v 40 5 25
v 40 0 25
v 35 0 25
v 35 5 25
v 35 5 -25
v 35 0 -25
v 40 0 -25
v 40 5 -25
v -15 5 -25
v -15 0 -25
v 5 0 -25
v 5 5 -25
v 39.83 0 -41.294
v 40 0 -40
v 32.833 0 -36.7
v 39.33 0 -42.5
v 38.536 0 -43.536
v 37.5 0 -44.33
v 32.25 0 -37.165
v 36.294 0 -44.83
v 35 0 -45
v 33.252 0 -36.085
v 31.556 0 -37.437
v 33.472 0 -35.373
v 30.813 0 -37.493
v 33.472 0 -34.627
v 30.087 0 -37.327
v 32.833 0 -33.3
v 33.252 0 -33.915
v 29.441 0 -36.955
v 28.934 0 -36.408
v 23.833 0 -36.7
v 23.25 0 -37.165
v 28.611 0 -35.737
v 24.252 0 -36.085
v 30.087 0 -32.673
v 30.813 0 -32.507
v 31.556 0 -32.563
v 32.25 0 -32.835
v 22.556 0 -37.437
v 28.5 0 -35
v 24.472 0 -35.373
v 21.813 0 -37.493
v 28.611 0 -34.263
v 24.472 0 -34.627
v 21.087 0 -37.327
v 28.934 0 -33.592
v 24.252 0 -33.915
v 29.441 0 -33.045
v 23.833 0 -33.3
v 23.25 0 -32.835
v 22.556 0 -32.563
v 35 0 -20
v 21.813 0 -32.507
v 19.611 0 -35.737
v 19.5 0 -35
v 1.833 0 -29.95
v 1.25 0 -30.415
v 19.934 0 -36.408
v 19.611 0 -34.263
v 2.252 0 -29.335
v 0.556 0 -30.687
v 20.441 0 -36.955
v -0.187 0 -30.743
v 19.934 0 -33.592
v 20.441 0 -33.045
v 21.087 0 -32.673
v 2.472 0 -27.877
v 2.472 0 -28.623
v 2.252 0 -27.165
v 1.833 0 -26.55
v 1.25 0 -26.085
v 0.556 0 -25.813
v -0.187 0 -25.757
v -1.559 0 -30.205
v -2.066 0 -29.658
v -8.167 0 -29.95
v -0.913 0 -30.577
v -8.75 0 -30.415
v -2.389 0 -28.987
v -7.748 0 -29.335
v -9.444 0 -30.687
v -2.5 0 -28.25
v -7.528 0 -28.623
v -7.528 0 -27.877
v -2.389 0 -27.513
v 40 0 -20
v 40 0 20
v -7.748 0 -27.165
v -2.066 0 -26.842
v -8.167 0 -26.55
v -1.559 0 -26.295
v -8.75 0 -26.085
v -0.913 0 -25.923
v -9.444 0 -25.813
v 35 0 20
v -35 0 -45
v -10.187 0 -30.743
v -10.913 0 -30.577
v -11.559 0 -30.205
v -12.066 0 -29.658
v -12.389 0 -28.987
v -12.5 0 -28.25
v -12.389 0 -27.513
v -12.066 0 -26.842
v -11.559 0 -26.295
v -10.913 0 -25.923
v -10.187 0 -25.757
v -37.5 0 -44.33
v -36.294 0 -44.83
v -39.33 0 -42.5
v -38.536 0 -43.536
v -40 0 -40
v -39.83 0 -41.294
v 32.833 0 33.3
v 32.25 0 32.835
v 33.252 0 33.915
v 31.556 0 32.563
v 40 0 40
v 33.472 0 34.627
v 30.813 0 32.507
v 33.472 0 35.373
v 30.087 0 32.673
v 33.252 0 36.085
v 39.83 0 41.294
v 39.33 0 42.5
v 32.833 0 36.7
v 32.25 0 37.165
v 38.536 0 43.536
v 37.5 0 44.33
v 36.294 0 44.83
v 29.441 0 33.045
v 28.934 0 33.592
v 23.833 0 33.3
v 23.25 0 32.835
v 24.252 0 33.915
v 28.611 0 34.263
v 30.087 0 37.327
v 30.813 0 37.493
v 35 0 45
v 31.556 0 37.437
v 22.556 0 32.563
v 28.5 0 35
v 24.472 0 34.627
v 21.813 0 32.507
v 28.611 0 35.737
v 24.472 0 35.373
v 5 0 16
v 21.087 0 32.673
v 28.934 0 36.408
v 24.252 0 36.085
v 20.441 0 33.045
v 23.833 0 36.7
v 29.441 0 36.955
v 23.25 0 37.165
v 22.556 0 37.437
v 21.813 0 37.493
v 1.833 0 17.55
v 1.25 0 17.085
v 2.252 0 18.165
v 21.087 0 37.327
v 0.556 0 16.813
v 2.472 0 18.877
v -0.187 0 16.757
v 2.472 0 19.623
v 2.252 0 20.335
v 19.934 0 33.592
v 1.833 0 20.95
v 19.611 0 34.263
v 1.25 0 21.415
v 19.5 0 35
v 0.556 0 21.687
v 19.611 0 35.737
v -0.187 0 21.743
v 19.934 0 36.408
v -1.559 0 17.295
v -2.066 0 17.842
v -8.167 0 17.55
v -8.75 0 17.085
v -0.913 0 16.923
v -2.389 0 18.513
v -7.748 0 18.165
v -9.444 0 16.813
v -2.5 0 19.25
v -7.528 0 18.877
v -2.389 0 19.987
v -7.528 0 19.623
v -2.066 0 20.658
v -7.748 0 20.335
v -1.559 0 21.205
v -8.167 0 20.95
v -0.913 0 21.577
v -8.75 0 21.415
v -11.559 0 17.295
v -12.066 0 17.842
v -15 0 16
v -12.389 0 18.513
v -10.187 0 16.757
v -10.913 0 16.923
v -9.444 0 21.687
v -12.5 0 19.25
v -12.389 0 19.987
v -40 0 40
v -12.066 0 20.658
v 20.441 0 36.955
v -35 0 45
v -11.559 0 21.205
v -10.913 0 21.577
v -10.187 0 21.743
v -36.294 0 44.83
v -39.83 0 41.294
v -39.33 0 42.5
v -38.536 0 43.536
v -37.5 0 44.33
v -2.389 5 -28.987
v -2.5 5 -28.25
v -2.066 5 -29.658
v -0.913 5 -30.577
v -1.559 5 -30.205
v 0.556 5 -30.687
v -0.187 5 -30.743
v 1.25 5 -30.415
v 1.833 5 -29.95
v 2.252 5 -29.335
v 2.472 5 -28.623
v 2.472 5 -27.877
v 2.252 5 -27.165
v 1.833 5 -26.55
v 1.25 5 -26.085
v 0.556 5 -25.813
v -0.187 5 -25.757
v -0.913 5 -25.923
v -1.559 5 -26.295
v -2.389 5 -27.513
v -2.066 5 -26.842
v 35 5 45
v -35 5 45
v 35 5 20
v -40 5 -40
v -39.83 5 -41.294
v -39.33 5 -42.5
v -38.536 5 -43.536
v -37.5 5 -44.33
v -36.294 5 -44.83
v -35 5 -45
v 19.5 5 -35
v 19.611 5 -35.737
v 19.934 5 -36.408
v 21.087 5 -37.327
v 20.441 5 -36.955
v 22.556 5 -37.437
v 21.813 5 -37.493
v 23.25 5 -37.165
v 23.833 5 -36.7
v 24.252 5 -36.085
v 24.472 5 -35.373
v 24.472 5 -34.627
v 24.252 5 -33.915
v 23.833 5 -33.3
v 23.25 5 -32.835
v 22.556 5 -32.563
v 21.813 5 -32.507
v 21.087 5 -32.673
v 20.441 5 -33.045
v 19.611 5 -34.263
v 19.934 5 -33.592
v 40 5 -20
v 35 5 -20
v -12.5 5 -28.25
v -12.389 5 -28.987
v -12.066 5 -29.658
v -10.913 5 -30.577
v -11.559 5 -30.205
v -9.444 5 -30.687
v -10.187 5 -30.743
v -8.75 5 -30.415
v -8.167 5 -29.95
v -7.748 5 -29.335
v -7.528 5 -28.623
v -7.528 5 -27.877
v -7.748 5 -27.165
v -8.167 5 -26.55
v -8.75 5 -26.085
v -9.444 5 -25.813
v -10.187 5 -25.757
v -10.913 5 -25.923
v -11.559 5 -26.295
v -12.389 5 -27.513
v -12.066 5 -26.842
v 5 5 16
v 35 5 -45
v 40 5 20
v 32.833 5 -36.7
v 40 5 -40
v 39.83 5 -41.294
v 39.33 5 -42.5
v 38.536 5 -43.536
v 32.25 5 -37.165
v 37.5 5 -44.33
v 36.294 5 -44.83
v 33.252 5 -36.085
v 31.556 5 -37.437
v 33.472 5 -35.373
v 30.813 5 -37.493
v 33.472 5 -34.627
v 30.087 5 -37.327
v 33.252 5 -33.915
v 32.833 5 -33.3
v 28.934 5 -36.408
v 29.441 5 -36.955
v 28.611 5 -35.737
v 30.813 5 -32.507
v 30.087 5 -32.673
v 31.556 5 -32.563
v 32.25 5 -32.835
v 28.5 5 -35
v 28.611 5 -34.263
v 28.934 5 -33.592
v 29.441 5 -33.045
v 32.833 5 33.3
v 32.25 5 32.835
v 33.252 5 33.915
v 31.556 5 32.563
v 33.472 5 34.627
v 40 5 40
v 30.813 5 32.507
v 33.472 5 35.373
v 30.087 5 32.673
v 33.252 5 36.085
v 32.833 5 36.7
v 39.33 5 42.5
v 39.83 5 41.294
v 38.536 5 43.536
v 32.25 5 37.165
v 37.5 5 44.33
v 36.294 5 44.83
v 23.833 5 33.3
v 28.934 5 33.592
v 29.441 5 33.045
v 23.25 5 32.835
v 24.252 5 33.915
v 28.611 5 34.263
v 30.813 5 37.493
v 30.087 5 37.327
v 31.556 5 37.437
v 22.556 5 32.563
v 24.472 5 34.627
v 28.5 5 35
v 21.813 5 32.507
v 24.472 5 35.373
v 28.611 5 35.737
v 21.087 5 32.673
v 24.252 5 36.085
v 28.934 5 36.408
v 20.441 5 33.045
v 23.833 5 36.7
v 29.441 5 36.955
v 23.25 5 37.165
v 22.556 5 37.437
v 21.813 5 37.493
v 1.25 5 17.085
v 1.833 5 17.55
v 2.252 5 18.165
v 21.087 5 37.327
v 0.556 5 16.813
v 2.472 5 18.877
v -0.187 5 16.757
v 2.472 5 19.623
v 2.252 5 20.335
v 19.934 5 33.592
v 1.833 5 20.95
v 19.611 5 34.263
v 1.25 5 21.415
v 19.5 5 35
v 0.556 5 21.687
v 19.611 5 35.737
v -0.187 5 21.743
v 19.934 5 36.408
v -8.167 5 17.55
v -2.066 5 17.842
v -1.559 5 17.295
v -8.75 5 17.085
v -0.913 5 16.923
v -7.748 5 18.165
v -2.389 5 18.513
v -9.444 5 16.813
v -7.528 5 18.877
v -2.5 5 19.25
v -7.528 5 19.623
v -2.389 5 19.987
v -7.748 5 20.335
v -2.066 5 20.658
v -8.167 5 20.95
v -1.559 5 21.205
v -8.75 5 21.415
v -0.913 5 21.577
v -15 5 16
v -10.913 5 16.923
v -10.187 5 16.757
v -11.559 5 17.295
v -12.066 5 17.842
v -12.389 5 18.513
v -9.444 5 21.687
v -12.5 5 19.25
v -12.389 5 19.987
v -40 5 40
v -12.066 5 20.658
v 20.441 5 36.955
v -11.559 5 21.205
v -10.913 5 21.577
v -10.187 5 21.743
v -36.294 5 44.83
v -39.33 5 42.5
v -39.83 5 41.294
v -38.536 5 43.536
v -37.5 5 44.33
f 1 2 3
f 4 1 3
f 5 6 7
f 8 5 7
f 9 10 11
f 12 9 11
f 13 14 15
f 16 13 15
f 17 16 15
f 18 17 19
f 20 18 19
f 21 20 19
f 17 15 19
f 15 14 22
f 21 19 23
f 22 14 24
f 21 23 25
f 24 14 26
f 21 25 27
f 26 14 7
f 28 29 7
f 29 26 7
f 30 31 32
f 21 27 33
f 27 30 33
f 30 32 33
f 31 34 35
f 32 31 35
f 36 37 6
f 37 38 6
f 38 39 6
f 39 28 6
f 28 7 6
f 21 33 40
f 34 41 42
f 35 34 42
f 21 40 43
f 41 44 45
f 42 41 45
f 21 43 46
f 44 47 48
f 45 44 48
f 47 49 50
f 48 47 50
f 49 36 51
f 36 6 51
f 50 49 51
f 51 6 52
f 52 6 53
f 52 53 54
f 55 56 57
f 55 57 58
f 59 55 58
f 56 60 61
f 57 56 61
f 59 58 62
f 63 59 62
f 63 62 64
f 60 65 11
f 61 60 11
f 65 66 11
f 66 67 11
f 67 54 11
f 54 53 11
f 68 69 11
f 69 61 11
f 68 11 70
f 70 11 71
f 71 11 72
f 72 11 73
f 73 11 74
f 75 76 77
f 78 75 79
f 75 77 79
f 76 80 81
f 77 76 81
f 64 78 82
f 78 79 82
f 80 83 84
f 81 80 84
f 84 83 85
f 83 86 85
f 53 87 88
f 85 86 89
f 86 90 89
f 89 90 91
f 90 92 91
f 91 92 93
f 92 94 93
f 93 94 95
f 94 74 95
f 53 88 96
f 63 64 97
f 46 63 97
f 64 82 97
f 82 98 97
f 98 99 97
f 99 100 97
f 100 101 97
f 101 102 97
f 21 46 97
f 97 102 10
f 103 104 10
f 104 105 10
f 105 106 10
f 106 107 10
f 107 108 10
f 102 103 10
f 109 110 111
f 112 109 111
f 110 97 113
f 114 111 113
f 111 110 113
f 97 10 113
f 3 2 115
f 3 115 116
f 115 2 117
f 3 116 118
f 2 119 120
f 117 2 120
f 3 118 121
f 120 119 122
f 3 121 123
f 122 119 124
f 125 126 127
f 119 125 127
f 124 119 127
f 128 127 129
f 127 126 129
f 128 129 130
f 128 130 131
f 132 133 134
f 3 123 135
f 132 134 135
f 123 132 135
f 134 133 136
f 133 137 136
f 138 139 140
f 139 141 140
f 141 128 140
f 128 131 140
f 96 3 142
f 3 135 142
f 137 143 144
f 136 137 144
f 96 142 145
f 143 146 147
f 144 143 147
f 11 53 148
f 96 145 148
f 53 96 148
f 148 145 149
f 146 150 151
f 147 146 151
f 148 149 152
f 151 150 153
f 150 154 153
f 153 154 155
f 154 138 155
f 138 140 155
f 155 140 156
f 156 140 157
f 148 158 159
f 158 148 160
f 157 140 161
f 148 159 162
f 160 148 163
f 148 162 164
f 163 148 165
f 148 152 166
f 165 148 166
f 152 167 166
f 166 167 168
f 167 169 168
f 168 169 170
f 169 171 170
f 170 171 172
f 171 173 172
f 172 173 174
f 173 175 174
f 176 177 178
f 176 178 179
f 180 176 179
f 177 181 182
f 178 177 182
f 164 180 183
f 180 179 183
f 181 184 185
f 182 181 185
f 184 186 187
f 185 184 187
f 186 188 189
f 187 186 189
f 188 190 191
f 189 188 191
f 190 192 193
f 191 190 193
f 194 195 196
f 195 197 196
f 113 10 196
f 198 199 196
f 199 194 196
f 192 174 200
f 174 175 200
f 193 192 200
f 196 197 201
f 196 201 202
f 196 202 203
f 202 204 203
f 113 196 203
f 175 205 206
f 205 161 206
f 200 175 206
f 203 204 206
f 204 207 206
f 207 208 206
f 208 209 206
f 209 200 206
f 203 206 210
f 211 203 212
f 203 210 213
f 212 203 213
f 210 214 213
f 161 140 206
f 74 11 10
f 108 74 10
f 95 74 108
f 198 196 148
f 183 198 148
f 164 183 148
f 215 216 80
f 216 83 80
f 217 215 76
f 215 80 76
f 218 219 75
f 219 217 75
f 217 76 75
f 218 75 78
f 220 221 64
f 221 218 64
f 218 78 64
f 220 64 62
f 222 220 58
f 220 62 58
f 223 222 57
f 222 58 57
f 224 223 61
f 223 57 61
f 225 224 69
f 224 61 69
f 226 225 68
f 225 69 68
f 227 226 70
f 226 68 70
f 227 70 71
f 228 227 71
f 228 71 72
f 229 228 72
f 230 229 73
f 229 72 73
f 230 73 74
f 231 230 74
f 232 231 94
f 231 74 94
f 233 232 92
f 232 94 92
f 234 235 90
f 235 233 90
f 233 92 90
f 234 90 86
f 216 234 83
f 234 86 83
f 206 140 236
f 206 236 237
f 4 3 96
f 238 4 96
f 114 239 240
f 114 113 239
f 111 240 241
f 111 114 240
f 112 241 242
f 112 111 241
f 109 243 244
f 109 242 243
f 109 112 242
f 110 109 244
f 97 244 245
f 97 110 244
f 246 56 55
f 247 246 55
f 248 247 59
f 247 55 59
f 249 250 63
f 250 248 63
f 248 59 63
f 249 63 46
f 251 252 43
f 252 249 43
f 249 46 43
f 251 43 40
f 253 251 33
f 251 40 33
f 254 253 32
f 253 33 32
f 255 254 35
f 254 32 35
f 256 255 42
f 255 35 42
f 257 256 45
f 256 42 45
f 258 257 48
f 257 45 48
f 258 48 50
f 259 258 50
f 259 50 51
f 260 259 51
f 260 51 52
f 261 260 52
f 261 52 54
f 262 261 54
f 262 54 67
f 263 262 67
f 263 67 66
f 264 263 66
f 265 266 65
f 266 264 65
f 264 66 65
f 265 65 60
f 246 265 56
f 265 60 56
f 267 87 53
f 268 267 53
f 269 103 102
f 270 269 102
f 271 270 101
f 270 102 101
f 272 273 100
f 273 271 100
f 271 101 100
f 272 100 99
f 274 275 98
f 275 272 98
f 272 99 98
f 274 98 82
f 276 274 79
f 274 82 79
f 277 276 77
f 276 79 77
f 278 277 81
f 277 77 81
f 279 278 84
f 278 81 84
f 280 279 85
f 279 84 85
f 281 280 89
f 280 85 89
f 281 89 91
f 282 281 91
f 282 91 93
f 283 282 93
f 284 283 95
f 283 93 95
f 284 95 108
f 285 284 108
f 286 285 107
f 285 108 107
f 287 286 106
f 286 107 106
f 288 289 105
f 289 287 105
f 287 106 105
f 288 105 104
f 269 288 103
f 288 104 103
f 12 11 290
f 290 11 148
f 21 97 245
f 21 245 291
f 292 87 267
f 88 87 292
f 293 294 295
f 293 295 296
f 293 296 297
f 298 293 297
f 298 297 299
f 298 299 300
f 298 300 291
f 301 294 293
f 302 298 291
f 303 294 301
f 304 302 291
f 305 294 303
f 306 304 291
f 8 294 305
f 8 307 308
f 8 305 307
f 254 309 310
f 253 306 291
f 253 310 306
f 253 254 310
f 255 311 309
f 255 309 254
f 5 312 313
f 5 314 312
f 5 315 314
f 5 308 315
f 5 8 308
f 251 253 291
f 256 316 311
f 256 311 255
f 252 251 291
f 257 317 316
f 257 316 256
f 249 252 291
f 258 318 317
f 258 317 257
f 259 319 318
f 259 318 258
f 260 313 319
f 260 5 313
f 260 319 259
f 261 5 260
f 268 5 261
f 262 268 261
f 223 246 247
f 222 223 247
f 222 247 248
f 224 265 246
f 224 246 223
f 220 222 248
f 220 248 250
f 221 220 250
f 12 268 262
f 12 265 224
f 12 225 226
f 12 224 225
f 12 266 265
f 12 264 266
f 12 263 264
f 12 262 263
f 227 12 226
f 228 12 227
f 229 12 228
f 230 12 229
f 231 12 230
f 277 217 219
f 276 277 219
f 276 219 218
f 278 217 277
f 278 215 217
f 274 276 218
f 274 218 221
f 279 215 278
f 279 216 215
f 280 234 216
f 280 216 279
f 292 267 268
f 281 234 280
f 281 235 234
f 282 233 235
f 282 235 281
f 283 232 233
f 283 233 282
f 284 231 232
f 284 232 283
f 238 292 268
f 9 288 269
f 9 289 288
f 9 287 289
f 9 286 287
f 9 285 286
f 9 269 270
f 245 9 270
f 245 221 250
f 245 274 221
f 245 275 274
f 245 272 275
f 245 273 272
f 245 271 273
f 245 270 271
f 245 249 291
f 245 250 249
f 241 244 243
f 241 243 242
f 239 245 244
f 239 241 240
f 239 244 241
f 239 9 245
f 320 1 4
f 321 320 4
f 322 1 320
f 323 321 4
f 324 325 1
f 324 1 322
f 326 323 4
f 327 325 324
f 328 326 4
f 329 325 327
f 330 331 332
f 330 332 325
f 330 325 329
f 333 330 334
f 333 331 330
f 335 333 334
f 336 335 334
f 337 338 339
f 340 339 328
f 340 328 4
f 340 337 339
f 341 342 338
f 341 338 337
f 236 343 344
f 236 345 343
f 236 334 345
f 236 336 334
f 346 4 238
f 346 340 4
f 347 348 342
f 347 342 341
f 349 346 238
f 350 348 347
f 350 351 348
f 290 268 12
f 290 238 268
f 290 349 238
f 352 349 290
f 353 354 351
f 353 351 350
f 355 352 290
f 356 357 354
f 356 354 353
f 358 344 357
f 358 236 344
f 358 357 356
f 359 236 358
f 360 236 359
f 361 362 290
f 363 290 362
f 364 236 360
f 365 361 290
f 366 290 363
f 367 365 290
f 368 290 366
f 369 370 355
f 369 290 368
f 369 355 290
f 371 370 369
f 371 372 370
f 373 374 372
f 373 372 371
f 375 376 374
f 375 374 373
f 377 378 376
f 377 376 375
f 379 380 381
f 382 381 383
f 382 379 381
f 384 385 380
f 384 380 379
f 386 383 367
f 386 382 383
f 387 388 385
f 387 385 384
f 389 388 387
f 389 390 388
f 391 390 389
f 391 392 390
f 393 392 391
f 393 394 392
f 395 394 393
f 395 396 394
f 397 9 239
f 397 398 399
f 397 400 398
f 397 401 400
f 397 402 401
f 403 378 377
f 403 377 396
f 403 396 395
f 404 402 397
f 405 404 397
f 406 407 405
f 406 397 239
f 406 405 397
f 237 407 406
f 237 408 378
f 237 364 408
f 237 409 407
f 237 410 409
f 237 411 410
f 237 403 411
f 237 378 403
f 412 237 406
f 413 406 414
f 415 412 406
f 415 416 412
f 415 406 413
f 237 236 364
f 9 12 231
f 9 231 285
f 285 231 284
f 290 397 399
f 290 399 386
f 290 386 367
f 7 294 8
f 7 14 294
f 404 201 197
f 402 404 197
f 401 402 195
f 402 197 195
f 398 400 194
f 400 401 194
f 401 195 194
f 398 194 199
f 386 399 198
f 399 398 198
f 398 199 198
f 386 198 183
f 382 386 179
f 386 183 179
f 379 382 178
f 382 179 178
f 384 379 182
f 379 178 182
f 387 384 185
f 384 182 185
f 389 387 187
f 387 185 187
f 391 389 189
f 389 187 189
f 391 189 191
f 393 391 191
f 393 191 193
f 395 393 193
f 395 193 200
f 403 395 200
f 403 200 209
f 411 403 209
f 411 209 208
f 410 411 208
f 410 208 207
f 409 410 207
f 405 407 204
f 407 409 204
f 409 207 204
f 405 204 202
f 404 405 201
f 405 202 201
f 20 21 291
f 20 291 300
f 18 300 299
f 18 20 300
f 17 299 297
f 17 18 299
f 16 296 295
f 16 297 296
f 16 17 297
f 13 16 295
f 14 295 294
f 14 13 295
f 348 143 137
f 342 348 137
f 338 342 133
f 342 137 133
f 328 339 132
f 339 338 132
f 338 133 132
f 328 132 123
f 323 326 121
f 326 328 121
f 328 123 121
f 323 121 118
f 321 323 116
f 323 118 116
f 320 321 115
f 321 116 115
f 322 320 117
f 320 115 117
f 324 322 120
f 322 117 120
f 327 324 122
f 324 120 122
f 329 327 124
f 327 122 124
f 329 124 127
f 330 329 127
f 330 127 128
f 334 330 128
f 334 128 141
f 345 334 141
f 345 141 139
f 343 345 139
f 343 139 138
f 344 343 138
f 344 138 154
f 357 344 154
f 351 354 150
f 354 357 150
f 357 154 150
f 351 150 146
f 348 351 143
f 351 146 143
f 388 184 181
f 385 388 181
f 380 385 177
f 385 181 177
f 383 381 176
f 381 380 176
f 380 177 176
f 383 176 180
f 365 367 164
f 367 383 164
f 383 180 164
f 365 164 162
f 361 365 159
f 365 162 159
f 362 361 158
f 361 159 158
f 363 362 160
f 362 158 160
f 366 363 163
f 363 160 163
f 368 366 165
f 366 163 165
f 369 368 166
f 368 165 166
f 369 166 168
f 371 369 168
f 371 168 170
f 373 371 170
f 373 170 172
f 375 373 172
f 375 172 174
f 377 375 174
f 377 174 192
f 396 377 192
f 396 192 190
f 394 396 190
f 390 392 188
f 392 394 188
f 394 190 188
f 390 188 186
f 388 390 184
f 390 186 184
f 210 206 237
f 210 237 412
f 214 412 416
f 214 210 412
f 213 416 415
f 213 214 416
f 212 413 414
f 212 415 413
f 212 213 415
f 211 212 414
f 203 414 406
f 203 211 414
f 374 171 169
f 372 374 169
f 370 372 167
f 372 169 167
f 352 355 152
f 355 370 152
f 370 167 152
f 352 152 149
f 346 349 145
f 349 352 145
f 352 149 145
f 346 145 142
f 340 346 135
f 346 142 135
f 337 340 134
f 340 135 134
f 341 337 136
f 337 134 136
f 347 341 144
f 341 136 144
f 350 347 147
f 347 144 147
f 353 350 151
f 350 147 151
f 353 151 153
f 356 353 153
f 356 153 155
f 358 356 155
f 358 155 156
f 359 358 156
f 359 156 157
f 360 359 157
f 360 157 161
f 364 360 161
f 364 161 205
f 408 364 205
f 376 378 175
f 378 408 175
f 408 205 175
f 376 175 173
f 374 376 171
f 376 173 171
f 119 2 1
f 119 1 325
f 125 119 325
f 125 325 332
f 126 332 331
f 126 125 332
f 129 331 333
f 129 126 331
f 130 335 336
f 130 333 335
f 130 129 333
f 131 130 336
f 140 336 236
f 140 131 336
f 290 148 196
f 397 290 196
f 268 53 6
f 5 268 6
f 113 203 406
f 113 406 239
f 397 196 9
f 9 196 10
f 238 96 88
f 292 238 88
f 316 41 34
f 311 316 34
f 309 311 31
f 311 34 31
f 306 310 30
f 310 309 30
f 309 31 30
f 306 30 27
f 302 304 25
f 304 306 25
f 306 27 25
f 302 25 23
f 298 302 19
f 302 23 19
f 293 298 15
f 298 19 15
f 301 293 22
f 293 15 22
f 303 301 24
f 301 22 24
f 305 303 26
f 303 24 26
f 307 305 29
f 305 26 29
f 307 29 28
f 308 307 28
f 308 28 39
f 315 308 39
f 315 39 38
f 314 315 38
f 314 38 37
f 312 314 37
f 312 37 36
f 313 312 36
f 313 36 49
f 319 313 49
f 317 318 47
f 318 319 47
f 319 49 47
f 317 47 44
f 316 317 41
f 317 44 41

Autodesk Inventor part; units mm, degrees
ref_plane "YZ Plane" through (0, 0, 0) normal (1, 0, 0) x (0, 1, 0)
ref_plane "XZ Plane" through (0, 0, 0) normal (0, 1, 0) x (-1, 0, 0)
ref_plane "XY Plane" through (0, 0, 0) normal (0, 0, 1) x (1, 0, 0)
sketch "Szkic1" plane through (0, 0, 0) normal (0, 1, 0) x (-1, 0, 0)
  line L0 (-35, 45) -> (35, 45)
  line L1 (40, 40) -> (40, -40)
  line L2 (35, -45) -> (-35, -45)
  line L3 (-40, -40) -> (-40, -25)
  line L4 (-40, 45) -> (40, -45) construction
  line L5 (40, 45) -> (-40, -45) construction
  arc A0 (40, 40) -> (35, 45) centre (35, 40) ccw
  arc A1 (-35, 45) -> (-40, 40) centre (-35, 40) ccw
  arc A2 (-40, -40) -> (-35, -45) centre (-35, -40) ccw
  arc A3 (35, -45) -> (40, -40) centre (35, -40) ccw
  line L6 (15, -25) -> (-5, -25)
  line L7 (-5, -25) -> (-5, 16)
  line L8 (-5, 16) -> (15, 16)
  line L9 (15, 16) -> (15, -25)
  circle A4 centre (10, 19.25) radius 2.5
  circle A5 centre (0, 19.25) radius 2.5
  circle A6 centre (10, -28.25) radius 2.5
  circle A7 centre (0, -28.25) radius 2.5
  line L10 (-40, 25) -> (-35, 25)
  line L11 (-35, 25) -> (-35, 20)
  line L12 (-35, 20) -> (-40, 20)
  line L13 (-40, -20) -> (-35, -20)
  line L14 (-35, -20) -> (-35, -25)
  line L15 (-35, -25) -> (-40, -25)
  line L16 (-40, 20) -> (-40, 25)
  line L17 (-40, 25) -> (-40, 40)
  line L18 (-40, -20) -> (-40, 20)
  circle A8 centre (-22, -35) radius 2.5
  circle A9 centre (-22, 35) radius 2.5
  circle A10 centre (-31, 35) radius 2.5
  circle A11 centre (-31, -35) radius 2.5
  point P0 (0, 0)
  dimension "d0" = 80
  dimension "d1" = 90
  dimension "d2" = 5
  dimension "d3" = 20
  dimension "d4" = 41
  dimension "d5" = 5
  dimension "d6" = 5
  dimension "d7" = 5
  dimension "d8" = 5
  dimension "d18" = 5
  dimension "d19" = 5
  dimension "d20" = 5
  dimension "d21" = 5
  dimension "d50" = 5
  dimension "d52" = 5
  dimension "d53" = 5
  dimension "d54" = 5
extrude "Wyciągnięcie proste3" add sketch "Szkic1" along normal blind 5 contours L0 A0 L1 A3 L2 A2 L3 L15 L14 L13 L18 L12 L11 L10 L17 A1
properties part number "Ground"
